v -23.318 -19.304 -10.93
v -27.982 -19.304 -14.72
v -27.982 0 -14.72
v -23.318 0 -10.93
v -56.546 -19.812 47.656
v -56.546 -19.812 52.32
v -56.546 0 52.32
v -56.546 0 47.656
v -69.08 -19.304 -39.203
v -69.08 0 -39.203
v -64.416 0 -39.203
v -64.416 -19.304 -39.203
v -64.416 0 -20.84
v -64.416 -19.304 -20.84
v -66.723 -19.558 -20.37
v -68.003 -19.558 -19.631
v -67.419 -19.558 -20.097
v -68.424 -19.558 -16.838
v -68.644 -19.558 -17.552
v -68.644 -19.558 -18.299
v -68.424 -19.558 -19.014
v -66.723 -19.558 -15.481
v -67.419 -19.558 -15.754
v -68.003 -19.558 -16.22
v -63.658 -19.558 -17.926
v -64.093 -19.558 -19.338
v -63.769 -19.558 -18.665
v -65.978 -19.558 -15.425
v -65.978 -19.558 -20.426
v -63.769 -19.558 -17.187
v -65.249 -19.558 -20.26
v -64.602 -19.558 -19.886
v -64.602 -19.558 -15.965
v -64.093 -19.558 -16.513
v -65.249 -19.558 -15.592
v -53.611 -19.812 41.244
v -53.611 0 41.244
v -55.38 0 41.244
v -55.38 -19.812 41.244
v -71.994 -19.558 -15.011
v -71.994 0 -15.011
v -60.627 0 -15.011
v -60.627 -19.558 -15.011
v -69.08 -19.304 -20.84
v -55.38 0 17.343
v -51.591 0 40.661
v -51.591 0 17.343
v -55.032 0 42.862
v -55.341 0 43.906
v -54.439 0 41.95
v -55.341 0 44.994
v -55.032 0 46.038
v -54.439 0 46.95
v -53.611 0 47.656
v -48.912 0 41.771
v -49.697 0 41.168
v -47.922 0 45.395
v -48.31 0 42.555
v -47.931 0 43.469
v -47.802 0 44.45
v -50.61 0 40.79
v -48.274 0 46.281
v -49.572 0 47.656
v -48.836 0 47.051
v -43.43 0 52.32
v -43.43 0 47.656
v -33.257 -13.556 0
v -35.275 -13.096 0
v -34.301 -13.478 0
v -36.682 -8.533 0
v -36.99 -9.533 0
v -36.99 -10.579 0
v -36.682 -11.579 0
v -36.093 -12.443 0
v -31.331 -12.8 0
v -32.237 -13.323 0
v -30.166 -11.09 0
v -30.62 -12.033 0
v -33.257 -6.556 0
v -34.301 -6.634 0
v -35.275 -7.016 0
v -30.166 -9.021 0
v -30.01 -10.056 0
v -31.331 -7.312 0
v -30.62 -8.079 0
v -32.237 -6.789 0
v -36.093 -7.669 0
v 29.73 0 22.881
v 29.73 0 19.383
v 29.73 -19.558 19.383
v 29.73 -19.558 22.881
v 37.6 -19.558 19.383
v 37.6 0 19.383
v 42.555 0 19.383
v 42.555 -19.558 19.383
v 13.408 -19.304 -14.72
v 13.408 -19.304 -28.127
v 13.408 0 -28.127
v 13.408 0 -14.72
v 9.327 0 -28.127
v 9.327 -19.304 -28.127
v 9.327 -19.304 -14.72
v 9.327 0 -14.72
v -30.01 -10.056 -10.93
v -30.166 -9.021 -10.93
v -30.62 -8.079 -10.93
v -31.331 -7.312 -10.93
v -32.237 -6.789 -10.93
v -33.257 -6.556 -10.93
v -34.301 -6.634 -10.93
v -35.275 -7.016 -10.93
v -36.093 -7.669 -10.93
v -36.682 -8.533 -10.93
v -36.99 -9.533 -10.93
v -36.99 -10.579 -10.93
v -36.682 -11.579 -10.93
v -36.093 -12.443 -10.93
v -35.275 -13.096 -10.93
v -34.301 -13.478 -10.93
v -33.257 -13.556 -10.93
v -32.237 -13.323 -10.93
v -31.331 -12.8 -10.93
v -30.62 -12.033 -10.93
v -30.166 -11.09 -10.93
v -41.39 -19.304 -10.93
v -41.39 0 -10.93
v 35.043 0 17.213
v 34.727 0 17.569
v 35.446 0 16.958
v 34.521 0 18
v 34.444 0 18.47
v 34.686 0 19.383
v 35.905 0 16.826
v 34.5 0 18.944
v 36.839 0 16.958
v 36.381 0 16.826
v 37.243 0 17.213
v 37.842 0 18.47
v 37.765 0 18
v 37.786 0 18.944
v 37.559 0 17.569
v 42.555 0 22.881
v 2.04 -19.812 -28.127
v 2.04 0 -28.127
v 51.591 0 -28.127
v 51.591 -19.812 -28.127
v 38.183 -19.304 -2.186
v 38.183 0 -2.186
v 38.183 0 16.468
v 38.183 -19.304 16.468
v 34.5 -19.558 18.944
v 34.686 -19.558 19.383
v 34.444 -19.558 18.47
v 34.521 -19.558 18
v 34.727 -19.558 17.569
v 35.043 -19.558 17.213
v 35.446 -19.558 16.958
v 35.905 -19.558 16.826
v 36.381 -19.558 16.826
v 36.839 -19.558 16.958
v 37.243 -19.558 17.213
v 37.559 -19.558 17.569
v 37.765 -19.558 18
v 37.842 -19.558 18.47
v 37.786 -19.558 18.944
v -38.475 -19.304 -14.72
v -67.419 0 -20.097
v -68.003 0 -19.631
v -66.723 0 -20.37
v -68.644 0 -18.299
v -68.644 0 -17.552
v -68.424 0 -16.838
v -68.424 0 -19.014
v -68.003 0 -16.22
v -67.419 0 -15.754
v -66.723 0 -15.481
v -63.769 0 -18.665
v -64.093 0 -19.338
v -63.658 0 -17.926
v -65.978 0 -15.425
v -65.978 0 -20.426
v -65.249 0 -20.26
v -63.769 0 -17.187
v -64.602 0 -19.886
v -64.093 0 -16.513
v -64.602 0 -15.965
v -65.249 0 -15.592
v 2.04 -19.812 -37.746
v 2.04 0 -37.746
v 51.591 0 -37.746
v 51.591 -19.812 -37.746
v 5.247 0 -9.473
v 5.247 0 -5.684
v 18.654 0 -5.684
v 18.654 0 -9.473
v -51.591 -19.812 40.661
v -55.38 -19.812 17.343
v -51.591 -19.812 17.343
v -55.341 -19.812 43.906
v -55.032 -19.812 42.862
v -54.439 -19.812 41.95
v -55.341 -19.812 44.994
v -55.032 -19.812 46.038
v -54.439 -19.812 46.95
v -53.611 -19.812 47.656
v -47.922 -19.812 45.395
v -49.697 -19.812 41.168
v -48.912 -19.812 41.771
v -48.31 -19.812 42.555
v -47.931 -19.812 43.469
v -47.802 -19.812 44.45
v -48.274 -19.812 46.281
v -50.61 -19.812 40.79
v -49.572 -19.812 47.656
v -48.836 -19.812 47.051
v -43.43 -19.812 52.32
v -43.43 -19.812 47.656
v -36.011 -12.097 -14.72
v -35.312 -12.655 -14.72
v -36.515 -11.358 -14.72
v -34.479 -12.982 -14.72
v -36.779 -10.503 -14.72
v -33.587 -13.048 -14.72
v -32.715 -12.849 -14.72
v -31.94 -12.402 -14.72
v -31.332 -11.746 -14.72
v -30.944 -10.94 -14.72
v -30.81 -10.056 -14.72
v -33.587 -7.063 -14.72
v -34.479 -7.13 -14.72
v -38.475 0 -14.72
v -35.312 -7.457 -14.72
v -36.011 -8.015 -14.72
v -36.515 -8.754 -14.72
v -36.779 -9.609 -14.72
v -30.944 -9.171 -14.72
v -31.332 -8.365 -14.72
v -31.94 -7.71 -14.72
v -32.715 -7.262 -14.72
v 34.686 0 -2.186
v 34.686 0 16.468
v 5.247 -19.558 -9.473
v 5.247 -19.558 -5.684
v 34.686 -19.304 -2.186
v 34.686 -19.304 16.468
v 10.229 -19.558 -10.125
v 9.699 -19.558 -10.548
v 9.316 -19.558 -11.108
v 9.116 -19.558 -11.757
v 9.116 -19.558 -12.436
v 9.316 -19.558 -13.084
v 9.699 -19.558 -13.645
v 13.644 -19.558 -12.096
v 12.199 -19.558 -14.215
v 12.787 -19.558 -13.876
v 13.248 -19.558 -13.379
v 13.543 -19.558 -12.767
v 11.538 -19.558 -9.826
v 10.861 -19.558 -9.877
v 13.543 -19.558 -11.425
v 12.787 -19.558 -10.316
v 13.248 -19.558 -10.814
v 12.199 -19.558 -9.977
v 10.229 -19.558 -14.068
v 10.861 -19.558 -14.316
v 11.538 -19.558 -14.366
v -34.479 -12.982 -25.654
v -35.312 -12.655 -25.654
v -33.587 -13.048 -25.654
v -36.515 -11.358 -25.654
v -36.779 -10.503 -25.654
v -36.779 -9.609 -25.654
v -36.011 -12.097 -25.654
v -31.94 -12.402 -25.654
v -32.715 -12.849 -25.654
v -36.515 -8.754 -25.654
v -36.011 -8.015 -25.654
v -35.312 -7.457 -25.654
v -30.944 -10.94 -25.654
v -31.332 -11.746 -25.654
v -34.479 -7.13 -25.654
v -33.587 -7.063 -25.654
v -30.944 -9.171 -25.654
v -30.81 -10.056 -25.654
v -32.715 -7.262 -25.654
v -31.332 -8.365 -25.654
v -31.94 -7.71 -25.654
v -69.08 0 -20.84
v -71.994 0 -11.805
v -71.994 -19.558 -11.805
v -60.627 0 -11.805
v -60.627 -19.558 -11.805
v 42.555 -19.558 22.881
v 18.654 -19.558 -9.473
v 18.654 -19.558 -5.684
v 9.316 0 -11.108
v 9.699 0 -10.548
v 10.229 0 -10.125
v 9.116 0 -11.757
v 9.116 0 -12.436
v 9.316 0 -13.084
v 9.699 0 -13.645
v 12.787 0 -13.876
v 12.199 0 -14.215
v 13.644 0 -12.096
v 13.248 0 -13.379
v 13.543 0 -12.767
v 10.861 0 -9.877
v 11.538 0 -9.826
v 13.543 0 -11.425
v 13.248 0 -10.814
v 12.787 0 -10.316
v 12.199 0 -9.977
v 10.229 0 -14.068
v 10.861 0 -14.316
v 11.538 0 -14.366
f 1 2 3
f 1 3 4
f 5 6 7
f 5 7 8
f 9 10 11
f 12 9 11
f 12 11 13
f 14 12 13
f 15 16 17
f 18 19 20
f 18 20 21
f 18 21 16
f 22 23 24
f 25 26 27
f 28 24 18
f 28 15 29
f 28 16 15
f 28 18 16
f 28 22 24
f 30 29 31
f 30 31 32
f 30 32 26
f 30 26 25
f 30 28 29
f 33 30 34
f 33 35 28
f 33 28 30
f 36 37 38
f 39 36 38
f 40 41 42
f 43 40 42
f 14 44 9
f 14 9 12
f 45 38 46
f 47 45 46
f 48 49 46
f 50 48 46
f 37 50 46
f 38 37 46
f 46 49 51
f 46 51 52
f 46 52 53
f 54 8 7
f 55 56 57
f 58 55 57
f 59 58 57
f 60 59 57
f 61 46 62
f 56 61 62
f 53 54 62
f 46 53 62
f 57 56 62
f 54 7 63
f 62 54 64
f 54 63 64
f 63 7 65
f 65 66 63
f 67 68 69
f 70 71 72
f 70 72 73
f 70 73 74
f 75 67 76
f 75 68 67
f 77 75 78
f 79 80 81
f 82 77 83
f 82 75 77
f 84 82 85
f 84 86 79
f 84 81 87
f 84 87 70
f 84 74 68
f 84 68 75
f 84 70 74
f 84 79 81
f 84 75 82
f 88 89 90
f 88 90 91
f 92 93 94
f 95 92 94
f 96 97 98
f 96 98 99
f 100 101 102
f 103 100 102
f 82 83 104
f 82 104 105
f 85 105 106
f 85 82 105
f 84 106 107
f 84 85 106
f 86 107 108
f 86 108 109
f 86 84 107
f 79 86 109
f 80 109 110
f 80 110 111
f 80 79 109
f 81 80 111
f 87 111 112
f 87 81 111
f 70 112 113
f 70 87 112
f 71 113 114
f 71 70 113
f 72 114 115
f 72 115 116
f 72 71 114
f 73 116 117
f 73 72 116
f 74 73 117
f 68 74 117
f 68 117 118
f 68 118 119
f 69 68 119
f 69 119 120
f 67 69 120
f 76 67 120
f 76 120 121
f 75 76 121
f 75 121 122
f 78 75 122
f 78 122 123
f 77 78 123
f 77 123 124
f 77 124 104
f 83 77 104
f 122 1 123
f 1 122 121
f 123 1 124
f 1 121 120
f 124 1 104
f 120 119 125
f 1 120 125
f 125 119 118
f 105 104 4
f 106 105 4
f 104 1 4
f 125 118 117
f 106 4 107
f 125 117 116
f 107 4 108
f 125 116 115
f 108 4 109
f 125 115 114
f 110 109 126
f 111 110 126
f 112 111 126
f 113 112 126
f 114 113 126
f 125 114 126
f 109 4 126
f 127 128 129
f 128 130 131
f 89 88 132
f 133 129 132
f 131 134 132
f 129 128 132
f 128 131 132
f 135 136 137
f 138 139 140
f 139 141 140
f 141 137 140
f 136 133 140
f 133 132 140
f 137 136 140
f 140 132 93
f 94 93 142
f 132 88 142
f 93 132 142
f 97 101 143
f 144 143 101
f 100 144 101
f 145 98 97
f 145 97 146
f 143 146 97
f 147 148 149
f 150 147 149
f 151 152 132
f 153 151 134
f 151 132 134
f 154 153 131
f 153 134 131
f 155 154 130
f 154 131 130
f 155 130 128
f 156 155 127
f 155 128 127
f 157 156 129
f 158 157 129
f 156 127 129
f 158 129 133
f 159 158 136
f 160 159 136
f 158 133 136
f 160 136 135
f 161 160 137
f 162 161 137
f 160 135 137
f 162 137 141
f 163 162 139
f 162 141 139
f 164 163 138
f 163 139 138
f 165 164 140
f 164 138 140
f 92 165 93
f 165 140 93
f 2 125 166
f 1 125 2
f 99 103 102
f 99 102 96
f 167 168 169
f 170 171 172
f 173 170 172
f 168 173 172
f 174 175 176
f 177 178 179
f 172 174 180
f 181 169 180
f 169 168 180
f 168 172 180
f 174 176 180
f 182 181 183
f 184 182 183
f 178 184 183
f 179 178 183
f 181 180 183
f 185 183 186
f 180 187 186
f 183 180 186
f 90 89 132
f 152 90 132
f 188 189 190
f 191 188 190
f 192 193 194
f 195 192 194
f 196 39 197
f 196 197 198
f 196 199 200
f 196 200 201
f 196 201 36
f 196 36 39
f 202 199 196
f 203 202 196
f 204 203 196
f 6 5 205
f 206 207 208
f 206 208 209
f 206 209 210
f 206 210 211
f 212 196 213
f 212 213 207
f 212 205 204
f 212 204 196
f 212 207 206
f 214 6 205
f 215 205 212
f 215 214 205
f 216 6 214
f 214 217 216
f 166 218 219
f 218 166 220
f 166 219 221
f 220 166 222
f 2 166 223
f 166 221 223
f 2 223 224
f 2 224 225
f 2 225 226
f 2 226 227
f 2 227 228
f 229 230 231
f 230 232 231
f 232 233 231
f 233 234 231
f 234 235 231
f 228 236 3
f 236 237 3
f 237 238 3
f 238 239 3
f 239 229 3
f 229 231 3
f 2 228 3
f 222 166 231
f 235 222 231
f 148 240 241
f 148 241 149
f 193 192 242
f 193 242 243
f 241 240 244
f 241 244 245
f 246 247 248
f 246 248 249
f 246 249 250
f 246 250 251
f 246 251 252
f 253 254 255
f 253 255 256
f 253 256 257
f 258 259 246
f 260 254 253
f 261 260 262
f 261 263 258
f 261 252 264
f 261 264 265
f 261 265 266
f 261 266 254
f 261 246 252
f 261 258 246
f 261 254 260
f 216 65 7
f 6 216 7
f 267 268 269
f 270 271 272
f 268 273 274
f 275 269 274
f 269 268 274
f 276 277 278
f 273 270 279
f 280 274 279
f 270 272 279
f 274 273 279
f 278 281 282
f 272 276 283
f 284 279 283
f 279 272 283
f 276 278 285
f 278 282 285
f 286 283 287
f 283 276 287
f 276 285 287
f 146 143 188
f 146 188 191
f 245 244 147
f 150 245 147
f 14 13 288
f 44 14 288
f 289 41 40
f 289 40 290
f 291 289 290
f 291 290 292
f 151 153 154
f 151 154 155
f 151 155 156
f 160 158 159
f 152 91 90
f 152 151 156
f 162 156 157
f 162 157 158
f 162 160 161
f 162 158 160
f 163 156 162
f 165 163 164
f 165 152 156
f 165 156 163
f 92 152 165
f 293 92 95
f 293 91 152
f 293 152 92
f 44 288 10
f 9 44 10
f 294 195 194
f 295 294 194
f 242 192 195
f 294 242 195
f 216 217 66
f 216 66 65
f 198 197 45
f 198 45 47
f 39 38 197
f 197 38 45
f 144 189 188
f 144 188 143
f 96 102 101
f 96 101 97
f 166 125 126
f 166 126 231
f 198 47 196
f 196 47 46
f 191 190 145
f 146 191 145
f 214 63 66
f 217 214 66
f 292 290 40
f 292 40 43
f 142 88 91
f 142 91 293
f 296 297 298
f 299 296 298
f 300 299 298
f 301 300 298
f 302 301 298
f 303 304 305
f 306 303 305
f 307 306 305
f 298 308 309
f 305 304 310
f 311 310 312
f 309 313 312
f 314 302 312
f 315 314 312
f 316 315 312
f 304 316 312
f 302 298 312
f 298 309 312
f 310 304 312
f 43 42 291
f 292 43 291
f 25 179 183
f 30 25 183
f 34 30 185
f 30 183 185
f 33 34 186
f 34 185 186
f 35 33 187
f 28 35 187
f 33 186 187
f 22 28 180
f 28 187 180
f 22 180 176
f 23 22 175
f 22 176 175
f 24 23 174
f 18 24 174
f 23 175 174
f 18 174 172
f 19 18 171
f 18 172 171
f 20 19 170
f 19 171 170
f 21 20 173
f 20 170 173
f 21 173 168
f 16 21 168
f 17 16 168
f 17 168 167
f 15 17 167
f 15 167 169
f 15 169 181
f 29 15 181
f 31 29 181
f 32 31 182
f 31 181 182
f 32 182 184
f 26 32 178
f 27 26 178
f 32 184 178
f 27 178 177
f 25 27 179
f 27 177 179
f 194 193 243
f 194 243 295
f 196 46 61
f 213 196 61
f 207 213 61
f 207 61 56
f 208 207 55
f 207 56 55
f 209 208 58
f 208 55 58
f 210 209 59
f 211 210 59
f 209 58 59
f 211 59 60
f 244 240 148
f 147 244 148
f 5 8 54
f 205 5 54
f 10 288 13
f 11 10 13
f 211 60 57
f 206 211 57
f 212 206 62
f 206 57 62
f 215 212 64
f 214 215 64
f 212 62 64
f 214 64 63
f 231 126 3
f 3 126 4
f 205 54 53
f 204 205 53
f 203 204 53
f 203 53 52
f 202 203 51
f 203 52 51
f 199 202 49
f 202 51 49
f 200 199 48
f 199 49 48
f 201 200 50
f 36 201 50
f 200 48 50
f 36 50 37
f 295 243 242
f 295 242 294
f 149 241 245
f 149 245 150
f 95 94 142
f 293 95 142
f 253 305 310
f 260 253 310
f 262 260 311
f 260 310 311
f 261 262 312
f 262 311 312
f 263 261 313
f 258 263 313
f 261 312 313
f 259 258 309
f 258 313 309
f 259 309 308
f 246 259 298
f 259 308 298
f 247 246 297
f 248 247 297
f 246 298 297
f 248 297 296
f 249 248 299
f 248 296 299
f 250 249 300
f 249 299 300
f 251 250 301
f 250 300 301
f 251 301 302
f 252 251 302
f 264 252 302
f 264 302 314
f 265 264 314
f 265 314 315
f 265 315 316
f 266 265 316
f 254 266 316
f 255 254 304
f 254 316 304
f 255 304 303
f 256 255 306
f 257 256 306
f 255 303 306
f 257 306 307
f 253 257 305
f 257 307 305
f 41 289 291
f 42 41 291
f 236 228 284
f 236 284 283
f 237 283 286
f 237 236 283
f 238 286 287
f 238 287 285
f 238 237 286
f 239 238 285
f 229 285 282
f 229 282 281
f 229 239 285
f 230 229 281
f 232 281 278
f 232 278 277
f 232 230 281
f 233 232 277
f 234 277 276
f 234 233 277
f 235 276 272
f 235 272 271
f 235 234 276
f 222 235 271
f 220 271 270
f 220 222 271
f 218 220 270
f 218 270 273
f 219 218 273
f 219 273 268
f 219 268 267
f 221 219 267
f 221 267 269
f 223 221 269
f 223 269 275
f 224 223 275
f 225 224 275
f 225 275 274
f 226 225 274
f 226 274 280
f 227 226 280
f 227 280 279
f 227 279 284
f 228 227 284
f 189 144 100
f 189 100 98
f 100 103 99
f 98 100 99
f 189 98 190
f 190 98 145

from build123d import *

# Parameters (mm, degrees)
F1_DEPTH  = 19.304
F0_W      = 4.0806541219
F0_H      = 14.5737696439
F0_W_2    = 3.4977011383
F0_H_2    = 18.6544265598
F2_R      = 3.5098288665
F3_DEPTH  = 13.716
F4_R      = 3.0009231641
F5_DEPTH  = 25.654
F6_R      = 2.2764952923
F7_DEPTH  = 19.558
F6_R_2    = 2.507365955
F6_R_3    = 1.6995801316
F8_W      = 12.8249209374
F8_H      = 3.4977048635
F9_DEPTH  = 19.558
F8_W_2    = 13.4078683332
F8_H_2    = 3.7891804241
F8_W_3    = 11.3675370812
F8_H_3    = 3.2062288374
F11_DEPTH = 19.812
F12_W     = 49.5508173481
F12_H     = 9.6186902374
F13_DEPTH = 19.812


with BuildPart() as f1:
    # F0 (on Front) → F1 (new body)
    with BuildSketch(Plane.XZ):
        Polygon((-69.0796747804, -20.8404920995), (-69.0796747804, -39.2034426332), (-64.4160658121, -39.2034426332), (-64.4160658121, -33.9568853378), (-64.4160658121, -20.8404920995), align=None)
    extrude(amount=F1_DEPTH)


with BuildPart() as f1b:
    # F0 (on Front) → F1, piece 2 (new body)
    with BuildSketch(Plane.XZ):
        Polygon((-41.3895100355, -10.9303286299), (-38.474753499, -14.7195085883), (-27.9816389084, -14.7195085883), (-23.3180336654, -10.9303286299), align=None)
    extrude(amount=F1_DEPTH)

    # F2 (on Top) → F3 (join)
    with BuildSketch(Plane.XY):
        with Locations((-33.5196740925, -10.0559014827)):
            Circle(F2_R)
    extrude(amount=-F3_DEPTH)

    # F4 (on Top) → F5 (join)
    with BuildSketch(Plane.XY):
        with Locations((-33.8111482561, -10.0559014827)):
            Circle(F4_R)
    extrude(amount=-F5_DEPTH)


with BuildPart() as f1c:
    # F0 (on Front) → F1, piece 3 (new body)
    with BuildSketch(Plane.XZ):
        with Locations((11.3675403409, -22.0063934103)):
            Rectangle(F0_W, F0_H)
    extrude(amount=F1_DEPTH)

    # F12 (on Front) → F13 (join)
    with BuildSketch(Plane.XZ):
        with Locations((26.8157380633, -32.9367229715)):
            Rectangle(F12_W, F12_H)
    extrude(amount=F13_DEPTH)


with BuildPart() as f1d:
    # F0 (on Front) → F1, piece 4 (new body)
    with BuildSketch(Plane.XZ):
        with Locations((36.4344287664, 7.1411477402)):
            Rectangle(F0_W_2, F0_H_2)
    extrude(amount=F1_DEPTH)


with BuildPart() as f7:
    # F6 (on Front) → F7 (new body)
    with BuildSketch(Plane.XZ):
        with Locations((11.3675408065, -12.0962299407)):
            Circle(F6_R)
    extrude(amount=F7_DEPTH)


with BuildPart() as f7b:
    # F6 (on Front) → F7, piece 2 (new body)
    with BuildSketch(Plane.XZ):
        with Locations((-66.1649182439, -17.9257374257)):
            Circle(F6_R_2)
    extrude(amount=F7_DEPTH)


with BuildPart() as f7c:
    # F6 (on Front) → F7, piece 3 (new body)
    with BuildSketch(Plane.XZ):
        with Locations((36.1429527402, 18.508689478)):
            Circle(F6_R_3)
    extrude(amount=F7_DEPTH)

    # F8 (on Front) → F9 (join)
    with BuildSketch(Plane.XZ):
        with Locations((36.1429499462, 21.1319681257)):
            Rectangle(F8_W, F8_H)
    extrude(amount=F9_DEPTH)


with BuildPart() as f9:
    # F8 (on Front) → F9, piece 2 (new body)
    with BuildSketch(Plane.XZ):
        with Locations((11.9504923932, -7.578361081)):
            Rectangle(F8_W_2, F8_H_2)
    extrude(amount=F9_DEPTH)


with BuildPart() as f9b:
    # F8 (on Front) → F9, piece 3 (new body)
    with BuildSketch(Plane.XZ):
        with Locations((-66.3106553257, -13.4078692645)):
            Rectangle(F8_W_3, F8_H_3)
    extrude(amount=F9_DEPTH)


with BuildPart() as f11:
    # F10 (on Front) → F11 (new body)
    with BuildSketch(Plane.XZ):
        with BuildLine():
            Line((-55.3803294897, 41.2437729537), (-55.3803294897, 17.342787236))
            Line((-55.3803294897, 17.342787236), (-51.5911504626, 17.342787236))
            Line((-51.5911504626, 17.342787236), (-51.5911504626, 40.6608246267))
            ThreePointArc((-51.5911504626, 40.6608246267), (-52.6420775711, 40.809477605), (-53.6105470055, 41.2437729537))
            Line((-53.6105470055, 41.2437729537), (-55.3803294897, 41.2437729537))
        make_face()
        with BuildLine():
            ThreePointArc((-53.6105529202, 47.6562306285), (-55.3803294897, 44.4500001587), (-53.6105470055, 41.2437729537))
            Line((-53.6105470055, 41.2437729537), (-51.5911504626, 41.2437729537))
            Line((-51.5911504626, 41.2437729537), (-51.5911504626, 40.6608246267))
            ThreePointArc((-51.5911504626, 40.6608246267), (-48.9117962774, 41.7706494686), (-47.8019714355, 44.4500036538))
            ThreePointArc((-47.8019714355, 44.4500036538), (-48.2737904325, 46.2811235651), (-49.571748005, 47.6562306285))
            Line((-49.571748005, 47.6562306285), (-53.6105529202, 47.6562306285))
        make_face()
        with BuildLine():
            Line((-51.5911504626, 41.2437729537), (-53.6105470055, 41.2437729537))
            ThreePointArc((-53.6105470055, 41.2437729537), (-52.6420775711, 40.809477605), (-51.5911504626, 40.6608246267))
            Line((-51.5911504626, 40.6608246267), (-51.5911504626, 41.2437729537))
        make_face()
        with BuildLine():
            Line((-56.5462298691, 47.6562306285), (-53.6105529202, 47.6562306285))
            ThreePointArc((-53.6105529202, 47.6562306285), (-51.5911504626, 48.2391826808), (-49.571748005, 47.6562306285))
            Line((-49.571748005, 47.6562306285), (-43.4298366308, 47.6562306285))
            Line((-43.4298366308, 47.6562306285), (-43.4298366308, 52.3198395967))
            Line((-43.4298366308, 52.3198395967), (-56.5462298691, 52.3198395967))
            Line((-56.5462298691, 52.3198395967), (-56.5462298691, 47.6562306285))
        make_face()
        with BuildLine():
            ThreePointArc((-49.571748005, 47.6562306285), (-51.5911504626, 48.2391826808), (-53.6105529202, 47.6562306285))
            Line((-53.6105529202, 47.6562306285), (-49.571748005, 47.6562306285))
        make_face()
    extrude(amount=F11_DEPTH)


solid = Compound([f1.part, f1b.part, f1c.part, f1d.part, f7.part, f7b.part, f7c.part, f9.part, f9b.part, f11.part])
